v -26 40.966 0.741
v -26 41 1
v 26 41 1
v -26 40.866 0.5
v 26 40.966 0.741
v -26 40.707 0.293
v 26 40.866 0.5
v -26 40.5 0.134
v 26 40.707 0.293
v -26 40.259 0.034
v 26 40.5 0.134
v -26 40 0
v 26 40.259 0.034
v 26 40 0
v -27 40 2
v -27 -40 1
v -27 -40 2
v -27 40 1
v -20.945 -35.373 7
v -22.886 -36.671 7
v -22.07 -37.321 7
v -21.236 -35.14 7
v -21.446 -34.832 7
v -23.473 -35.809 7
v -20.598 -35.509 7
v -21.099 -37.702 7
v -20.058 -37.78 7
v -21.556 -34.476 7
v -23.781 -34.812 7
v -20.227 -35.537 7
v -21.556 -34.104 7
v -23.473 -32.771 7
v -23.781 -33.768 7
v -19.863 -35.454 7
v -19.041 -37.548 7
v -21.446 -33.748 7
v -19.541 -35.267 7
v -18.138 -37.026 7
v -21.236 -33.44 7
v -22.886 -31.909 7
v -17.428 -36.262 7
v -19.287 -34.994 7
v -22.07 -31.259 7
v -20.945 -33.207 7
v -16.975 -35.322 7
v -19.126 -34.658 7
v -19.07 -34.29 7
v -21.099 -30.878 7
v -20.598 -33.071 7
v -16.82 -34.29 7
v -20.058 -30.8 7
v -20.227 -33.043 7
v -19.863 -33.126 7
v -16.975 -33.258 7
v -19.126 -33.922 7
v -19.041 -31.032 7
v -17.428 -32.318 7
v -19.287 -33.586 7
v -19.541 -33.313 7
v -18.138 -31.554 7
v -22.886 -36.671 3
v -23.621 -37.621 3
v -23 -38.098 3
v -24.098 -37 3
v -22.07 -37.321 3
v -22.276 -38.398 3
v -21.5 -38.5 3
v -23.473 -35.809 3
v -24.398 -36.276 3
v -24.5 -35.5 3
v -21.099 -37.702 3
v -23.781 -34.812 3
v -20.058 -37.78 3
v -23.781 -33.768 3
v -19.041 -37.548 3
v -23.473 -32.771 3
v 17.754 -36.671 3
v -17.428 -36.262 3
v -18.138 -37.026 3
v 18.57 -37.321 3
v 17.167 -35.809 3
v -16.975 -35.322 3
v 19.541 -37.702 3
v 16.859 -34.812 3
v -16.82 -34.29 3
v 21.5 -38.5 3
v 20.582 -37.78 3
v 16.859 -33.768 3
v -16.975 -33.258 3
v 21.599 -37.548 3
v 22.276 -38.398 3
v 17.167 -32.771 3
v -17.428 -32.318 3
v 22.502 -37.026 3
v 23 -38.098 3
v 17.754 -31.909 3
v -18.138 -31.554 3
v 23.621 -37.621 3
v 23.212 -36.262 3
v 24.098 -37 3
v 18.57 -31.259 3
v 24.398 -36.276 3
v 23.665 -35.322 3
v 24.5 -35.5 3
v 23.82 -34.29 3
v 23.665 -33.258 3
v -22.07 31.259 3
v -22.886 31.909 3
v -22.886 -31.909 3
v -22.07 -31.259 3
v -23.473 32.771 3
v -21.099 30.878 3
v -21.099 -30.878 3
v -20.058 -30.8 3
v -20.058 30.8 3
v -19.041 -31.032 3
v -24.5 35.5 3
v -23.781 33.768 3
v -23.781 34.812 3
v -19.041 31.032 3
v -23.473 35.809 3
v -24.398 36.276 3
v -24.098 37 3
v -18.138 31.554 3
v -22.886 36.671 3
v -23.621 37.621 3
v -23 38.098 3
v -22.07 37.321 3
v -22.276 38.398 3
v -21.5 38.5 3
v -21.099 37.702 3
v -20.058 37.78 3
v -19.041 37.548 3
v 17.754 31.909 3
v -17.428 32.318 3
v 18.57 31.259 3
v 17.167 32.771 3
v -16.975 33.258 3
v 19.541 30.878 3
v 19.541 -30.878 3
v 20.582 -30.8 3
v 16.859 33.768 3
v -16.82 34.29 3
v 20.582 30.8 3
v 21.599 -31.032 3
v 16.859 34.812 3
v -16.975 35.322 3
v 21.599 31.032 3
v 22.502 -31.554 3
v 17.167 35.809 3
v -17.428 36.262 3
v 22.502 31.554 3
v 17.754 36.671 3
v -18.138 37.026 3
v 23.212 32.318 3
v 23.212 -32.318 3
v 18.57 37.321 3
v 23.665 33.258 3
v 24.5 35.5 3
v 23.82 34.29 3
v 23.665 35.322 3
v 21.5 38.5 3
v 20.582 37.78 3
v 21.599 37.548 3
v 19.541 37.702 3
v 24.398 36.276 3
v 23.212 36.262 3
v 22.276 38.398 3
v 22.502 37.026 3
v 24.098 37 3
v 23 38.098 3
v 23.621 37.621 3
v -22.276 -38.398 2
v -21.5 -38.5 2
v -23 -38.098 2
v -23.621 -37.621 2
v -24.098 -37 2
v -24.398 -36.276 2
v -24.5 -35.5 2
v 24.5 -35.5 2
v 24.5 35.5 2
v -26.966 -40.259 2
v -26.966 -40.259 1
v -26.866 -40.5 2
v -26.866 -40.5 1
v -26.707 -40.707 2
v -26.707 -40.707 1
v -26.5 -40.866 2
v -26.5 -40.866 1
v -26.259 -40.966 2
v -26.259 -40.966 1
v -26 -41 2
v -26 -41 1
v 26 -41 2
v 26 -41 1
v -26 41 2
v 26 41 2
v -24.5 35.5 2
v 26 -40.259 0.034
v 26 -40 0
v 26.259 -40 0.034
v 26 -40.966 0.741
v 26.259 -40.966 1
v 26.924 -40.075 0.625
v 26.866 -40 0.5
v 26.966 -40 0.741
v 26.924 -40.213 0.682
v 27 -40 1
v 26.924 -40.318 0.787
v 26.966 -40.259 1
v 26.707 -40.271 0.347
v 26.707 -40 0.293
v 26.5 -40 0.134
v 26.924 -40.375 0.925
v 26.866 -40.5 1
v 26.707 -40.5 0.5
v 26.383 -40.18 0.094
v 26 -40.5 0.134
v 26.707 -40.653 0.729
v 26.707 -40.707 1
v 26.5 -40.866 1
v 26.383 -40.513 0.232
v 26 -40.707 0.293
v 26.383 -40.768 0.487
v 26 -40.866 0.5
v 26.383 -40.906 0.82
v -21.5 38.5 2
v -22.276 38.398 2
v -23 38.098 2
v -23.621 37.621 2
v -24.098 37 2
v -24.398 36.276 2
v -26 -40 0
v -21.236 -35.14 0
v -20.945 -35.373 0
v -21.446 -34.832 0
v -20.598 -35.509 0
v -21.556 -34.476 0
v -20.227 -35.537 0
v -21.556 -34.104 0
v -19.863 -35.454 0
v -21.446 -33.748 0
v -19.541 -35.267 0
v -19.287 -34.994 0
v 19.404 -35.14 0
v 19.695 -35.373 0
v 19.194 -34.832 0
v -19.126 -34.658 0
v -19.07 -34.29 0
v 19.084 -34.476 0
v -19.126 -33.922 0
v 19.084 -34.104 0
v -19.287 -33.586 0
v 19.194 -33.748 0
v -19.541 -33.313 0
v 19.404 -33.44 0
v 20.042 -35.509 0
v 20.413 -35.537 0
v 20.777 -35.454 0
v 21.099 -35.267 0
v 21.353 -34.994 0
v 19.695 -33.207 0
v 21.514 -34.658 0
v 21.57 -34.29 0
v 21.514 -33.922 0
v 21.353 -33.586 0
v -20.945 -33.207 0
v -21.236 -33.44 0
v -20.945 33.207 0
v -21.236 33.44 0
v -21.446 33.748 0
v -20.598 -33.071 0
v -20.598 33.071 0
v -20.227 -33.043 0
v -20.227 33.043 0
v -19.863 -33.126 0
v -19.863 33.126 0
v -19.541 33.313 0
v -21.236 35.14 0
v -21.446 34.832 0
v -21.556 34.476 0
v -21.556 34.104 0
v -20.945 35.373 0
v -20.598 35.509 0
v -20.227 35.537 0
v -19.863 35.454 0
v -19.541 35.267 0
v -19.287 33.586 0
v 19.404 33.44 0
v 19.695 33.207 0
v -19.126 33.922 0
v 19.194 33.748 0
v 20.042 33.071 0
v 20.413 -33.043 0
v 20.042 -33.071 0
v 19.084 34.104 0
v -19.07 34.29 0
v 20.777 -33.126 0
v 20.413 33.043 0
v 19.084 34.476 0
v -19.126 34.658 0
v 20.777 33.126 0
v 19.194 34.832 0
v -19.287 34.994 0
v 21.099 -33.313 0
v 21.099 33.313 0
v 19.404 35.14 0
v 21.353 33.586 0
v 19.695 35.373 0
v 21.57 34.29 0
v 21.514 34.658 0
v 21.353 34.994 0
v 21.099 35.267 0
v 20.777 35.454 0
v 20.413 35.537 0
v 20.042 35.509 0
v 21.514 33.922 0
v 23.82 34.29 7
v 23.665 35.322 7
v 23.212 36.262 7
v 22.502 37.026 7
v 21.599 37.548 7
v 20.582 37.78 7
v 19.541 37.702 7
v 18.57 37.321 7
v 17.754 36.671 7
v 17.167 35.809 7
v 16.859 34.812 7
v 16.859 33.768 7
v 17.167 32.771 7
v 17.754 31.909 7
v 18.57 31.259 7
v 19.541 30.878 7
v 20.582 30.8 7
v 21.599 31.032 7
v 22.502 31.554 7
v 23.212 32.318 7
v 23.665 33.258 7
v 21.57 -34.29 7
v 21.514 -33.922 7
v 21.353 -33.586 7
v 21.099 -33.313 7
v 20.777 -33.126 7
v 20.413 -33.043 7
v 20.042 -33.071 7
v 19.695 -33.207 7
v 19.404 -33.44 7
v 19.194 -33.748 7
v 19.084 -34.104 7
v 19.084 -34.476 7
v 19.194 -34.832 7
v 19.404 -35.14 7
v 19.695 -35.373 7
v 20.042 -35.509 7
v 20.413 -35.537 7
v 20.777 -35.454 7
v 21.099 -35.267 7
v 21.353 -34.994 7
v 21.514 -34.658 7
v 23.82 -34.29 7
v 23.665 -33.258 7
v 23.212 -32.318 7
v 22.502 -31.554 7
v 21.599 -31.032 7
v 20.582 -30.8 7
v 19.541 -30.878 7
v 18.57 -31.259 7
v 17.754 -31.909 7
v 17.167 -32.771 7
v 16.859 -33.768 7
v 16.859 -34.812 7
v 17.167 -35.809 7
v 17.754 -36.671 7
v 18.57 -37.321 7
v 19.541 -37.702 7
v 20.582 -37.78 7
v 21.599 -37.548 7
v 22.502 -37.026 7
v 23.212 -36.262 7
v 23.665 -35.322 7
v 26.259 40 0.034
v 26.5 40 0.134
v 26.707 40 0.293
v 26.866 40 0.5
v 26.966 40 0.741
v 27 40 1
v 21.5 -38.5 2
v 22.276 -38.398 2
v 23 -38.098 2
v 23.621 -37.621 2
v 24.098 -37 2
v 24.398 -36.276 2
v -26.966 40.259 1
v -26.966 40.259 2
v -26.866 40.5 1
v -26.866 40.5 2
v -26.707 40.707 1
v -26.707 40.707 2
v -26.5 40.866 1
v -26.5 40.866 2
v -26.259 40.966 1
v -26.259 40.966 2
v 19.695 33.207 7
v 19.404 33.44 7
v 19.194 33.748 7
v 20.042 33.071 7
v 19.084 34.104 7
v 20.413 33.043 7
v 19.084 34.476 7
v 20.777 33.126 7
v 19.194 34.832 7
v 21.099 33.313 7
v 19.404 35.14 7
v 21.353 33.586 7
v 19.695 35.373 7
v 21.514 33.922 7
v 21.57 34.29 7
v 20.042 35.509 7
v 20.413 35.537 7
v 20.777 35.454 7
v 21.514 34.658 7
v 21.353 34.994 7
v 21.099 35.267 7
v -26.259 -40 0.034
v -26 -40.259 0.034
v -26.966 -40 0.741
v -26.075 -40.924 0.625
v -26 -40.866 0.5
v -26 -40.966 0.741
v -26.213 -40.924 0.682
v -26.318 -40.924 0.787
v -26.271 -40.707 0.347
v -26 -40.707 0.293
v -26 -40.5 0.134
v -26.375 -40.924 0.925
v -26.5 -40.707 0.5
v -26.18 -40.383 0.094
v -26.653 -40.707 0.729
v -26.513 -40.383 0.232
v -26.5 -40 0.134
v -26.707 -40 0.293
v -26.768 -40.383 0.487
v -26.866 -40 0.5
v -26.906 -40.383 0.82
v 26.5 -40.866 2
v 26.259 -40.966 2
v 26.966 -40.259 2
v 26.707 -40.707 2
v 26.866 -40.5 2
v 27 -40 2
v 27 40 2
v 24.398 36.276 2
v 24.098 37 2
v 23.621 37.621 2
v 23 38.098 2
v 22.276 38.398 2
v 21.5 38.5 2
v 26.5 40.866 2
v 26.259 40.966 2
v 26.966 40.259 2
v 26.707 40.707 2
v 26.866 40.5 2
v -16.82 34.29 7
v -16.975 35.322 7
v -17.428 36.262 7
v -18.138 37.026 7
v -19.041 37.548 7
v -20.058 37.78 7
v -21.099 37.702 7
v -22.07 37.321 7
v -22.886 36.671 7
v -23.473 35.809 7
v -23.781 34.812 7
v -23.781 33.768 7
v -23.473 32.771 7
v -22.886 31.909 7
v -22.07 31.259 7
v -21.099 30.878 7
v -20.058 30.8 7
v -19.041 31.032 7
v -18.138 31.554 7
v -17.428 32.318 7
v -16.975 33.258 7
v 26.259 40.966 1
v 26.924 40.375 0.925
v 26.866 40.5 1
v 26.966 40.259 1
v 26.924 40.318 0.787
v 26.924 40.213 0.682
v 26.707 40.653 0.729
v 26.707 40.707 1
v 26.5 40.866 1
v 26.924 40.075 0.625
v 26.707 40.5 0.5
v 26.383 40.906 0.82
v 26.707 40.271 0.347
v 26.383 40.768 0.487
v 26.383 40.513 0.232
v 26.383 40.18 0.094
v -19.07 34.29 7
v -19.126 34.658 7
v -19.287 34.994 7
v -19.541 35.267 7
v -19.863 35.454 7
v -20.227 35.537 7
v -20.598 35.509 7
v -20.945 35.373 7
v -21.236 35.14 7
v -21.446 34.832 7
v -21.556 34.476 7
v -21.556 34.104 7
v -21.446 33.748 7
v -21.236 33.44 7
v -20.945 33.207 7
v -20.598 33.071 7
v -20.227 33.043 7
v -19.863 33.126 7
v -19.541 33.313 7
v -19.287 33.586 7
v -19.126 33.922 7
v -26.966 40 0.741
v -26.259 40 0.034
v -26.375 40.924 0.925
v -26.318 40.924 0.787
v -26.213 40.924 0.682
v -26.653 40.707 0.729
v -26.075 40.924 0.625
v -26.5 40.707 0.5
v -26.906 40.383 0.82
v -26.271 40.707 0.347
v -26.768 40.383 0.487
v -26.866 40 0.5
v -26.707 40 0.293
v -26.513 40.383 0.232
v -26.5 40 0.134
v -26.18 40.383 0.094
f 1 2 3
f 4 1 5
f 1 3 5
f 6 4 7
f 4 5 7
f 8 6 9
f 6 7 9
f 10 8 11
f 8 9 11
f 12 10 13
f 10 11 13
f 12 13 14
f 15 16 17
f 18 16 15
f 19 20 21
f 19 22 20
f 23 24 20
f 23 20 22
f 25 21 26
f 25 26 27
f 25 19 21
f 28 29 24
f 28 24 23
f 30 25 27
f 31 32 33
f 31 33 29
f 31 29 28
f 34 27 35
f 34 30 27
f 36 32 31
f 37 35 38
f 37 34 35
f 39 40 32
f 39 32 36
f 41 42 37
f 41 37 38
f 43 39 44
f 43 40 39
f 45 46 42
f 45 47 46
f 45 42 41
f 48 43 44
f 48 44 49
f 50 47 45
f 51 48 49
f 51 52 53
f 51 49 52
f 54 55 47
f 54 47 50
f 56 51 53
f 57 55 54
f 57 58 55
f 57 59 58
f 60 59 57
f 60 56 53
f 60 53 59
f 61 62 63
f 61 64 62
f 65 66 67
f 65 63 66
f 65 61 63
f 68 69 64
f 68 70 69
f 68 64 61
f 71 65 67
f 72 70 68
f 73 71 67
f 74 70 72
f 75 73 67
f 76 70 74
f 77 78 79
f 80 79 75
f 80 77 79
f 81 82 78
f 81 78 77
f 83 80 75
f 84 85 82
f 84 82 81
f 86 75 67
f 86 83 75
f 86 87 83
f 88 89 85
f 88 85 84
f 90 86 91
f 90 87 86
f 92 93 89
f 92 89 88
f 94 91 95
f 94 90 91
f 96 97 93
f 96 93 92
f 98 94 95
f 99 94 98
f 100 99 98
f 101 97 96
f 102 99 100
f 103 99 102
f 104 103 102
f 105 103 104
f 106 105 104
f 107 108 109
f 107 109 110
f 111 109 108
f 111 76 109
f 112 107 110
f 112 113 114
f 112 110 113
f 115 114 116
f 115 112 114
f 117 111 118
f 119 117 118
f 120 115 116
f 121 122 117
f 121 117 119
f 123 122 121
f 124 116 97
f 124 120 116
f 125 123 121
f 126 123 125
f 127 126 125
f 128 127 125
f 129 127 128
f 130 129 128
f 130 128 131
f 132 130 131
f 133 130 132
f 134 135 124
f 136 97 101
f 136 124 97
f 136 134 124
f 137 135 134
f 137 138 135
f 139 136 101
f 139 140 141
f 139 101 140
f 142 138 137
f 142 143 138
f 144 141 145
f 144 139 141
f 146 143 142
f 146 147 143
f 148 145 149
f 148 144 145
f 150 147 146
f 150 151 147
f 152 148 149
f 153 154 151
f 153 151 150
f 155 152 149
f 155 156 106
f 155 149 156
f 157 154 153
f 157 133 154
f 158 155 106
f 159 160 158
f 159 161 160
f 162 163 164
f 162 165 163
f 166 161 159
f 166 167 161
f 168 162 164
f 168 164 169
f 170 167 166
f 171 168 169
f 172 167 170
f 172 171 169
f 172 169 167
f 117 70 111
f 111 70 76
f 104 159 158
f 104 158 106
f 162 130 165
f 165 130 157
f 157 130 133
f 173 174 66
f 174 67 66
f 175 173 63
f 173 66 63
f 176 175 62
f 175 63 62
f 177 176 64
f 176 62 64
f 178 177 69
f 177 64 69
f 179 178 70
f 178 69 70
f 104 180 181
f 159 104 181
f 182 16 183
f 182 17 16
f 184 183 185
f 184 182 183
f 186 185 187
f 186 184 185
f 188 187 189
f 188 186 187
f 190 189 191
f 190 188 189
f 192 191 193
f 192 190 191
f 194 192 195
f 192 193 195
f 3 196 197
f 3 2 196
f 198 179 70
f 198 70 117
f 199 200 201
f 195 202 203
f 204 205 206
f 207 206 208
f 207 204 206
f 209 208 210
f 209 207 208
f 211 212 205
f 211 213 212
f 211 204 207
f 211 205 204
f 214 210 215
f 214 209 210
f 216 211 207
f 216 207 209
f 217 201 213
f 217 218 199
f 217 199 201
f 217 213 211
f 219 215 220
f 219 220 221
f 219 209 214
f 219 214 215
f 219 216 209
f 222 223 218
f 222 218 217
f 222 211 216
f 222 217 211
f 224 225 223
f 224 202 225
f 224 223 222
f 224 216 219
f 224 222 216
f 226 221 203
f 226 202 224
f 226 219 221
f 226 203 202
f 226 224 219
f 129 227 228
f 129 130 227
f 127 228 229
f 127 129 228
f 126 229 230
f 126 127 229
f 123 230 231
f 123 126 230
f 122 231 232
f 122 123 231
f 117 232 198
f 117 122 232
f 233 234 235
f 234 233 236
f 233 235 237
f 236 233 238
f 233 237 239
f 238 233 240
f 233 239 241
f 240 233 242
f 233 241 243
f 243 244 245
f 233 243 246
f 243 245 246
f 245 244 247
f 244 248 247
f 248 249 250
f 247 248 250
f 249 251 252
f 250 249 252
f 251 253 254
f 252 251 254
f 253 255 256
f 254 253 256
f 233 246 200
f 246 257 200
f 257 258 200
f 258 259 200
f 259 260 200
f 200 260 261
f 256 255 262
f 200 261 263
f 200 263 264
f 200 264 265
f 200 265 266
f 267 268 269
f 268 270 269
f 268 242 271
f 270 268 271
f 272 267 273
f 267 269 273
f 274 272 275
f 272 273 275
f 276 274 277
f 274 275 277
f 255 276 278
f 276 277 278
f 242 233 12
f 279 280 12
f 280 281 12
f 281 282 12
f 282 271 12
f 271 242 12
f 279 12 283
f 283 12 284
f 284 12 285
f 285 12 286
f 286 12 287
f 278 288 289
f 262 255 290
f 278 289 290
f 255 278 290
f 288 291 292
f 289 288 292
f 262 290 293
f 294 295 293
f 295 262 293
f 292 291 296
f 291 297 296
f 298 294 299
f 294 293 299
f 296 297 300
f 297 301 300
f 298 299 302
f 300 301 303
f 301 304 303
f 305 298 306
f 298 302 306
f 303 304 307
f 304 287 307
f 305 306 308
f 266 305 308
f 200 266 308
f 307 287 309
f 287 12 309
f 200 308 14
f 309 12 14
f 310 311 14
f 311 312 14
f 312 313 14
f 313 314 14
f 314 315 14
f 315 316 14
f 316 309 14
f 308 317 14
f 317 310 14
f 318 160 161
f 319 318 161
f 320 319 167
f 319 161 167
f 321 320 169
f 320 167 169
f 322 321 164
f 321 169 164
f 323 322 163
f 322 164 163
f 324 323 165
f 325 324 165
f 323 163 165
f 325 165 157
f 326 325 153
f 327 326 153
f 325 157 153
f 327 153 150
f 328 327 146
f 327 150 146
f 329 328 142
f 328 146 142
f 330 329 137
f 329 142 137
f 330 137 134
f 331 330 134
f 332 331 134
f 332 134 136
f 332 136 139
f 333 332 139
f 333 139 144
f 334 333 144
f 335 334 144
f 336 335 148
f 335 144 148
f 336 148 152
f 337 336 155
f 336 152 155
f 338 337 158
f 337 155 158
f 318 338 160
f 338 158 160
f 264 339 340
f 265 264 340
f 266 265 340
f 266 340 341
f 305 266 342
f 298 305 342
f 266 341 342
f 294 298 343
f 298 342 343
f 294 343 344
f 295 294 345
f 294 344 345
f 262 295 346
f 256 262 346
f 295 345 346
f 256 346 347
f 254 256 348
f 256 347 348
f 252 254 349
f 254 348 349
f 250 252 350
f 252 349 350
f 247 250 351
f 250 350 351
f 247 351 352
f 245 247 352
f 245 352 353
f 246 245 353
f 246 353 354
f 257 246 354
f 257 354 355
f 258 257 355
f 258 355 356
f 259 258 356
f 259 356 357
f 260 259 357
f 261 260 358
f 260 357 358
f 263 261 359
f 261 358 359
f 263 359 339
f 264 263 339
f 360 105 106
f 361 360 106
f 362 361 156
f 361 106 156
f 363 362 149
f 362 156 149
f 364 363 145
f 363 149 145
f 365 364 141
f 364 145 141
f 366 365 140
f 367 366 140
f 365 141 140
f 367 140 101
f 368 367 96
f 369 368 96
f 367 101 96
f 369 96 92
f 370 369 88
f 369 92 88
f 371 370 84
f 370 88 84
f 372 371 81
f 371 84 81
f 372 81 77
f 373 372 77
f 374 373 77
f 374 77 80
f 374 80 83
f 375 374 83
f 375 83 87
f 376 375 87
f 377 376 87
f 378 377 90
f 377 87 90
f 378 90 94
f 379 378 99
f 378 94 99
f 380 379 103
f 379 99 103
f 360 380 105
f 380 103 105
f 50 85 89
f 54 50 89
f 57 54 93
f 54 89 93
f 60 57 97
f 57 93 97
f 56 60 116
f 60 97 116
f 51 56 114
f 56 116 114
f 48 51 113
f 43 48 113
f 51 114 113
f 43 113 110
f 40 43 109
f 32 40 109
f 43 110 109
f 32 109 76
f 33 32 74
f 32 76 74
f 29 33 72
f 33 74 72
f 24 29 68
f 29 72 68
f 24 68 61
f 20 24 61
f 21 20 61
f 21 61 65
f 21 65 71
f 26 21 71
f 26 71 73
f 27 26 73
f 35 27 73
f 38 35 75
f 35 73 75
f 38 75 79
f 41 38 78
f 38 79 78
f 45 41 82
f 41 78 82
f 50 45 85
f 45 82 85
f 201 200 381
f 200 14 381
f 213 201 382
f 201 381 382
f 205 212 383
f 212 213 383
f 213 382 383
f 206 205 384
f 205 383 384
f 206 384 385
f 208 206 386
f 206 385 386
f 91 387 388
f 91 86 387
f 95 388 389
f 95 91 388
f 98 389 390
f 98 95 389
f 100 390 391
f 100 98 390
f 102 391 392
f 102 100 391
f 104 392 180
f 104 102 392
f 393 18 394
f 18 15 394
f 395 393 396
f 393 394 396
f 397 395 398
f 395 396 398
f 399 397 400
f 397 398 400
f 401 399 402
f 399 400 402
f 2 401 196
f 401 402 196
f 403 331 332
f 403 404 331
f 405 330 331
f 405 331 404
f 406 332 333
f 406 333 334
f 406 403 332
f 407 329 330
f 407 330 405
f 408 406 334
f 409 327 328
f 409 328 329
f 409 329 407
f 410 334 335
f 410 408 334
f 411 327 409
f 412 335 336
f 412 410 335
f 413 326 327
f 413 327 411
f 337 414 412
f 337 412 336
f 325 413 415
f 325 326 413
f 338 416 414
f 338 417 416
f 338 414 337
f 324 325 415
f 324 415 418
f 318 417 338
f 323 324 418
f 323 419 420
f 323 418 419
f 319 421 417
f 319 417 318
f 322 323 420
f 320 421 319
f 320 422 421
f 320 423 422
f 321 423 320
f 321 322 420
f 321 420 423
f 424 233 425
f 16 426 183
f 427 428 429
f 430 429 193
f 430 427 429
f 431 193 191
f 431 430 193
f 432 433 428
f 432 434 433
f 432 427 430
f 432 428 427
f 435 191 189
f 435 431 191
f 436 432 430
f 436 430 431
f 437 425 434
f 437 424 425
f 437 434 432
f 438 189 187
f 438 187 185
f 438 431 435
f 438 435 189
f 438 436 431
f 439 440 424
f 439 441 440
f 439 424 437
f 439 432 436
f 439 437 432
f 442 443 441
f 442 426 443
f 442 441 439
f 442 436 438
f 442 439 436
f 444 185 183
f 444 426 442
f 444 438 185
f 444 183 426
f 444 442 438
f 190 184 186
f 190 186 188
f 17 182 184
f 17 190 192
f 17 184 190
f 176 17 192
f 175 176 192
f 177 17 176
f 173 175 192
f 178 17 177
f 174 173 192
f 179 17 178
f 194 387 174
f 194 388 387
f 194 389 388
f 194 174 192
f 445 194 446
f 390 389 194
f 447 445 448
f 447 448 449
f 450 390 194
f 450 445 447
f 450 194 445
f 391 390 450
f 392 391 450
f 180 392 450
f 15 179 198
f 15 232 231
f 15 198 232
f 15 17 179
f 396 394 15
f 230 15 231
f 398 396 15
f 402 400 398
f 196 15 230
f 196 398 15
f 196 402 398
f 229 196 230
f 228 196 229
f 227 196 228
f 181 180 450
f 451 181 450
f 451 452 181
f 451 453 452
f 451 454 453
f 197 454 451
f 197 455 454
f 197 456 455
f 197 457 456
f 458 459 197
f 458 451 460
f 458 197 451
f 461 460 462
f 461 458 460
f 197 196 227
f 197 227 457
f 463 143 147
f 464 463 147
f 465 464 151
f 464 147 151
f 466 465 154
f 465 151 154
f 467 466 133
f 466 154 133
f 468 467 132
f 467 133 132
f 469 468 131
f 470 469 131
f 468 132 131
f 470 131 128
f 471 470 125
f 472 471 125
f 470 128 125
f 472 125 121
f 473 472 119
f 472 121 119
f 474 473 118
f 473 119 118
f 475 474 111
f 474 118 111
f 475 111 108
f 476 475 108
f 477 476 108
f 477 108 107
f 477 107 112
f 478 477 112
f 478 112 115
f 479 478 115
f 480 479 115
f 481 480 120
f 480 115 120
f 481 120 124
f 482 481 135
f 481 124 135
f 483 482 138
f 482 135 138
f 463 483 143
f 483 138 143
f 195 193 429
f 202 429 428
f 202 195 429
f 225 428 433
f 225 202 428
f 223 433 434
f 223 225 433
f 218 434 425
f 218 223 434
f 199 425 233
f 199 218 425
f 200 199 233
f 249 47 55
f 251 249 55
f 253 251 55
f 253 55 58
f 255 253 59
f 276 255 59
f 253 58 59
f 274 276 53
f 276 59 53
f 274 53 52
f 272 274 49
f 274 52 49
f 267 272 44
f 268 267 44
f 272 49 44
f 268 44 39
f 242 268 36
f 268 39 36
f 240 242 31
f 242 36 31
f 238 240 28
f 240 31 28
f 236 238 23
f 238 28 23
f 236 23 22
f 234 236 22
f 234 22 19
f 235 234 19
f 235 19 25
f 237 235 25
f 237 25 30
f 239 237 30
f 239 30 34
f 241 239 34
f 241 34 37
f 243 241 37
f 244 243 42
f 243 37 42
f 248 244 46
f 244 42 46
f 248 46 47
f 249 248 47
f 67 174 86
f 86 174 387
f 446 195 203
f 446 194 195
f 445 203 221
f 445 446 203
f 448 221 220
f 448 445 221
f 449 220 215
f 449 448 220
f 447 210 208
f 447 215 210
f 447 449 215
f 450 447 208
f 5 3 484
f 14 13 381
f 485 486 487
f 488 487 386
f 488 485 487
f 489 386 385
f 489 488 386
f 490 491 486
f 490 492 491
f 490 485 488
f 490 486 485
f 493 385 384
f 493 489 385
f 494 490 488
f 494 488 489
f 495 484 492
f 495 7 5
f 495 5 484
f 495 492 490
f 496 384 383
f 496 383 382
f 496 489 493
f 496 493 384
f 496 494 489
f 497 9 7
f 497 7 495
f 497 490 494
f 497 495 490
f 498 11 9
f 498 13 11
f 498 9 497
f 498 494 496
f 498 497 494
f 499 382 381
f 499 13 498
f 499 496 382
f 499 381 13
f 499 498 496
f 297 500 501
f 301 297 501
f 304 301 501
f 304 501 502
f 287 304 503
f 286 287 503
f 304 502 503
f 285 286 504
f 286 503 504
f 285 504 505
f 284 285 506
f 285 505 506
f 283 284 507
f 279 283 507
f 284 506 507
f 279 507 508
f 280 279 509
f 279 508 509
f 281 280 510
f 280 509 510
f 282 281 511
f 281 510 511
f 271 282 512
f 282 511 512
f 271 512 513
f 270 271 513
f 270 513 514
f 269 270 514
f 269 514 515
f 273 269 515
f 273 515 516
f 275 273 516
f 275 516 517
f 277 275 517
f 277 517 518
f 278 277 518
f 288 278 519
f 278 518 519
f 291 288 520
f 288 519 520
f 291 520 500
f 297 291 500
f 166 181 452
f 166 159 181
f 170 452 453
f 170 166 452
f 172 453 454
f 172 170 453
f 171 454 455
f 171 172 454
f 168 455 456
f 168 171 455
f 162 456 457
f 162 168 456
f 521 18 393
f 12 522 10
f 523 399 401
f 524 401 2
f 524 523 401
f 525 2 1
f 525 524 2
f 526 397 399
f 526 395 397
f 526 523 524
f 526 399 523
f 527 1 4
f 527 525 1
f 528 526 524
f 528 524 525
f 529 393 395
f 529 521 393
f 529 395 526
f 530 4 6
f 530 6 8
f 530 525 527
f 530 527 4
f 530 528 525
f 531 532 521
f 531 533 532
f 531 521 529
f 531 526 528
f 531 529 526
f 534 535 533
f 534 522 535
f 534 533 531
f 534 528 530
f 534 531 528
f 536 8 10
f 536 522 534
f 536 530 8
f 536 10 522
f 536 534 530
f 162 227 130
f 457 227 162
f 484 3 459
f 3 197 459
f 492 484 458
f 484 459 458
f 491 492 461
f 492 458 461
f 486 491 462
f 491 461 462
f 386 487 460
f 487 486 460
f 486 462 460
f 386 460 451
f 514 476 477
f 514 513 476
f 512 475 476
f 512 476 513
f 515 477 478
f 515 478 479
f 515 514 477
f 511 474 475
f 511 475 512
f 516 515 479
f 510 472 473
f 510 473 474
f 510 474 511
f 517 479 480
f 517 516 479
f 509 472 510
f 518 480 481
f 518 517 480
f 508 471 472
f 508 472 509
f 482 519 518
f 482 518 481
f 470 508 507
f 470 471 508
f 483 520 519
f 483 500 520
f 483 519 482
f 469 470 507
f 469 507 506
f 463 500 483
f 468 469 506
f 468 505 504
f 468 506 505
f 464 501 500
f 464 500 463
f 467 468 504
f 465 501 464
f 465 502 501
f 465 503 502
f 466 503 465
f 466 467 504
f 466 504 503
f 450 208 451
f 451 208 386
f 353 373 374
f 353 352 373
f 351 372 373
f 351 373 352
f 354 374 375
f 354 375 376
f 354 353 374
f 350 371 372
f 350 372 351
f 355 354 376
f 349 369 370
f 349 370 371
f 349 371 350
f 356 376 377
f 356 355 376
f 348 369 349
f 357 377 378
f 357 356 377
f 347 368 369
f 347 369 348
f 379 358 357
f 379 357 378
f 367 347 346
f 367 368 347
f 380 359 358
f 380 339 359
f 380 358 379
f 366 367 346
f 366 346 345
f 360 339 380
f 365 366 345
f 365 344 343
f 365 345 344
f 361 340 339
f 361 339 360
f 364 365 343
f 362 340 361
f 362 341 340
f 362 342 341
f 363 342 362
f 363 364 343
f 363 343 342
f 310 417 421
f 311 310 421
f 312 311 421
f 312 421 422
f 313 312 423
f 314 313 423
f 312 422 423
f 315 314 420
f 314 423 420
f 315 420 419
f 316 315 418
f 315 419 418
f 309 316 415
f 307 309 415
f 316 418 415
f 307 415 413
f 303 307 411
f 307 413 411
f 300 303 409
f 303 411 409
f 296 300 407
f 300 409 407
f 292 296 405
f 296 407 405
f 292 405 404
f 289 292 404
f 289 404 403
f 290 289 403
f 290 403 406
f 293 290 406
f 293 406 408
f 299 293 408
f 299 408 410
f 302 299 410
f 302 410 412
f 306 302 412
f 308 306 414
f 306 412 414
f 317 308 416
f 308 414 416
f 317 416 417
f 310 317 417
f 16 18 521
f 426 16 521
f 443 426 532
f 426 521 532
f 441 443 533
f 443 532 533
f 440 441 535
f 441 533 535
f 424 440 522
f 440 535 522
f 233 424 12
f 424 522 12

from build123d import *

# Parameters (mm, degrees)
SKETCH_W     = 54
SKETCH_H     = 82
PAD_DEPTH    = 2
SKETCH001_W  = 49
SKETCH001_H  = 77
PAD001_DEPTH = 1
SKETCH002_R  = 3.5
PAD002_DEPTH = 4
SKETCH003_R  = 1.25
POCKET_DEPTH = 7
FILLET_R     = 1
FILLET001_R  = 3


with BuildPart() as part:
    # Sketch → Pad (new body)
    with BuildSketch(Plane.XY):
        Rectangle(SKETCH_W, SKETCH_H)
    extrude(amount=PAD_DEPTH)

    # Sketch001 (on Face6 of Pad) → Pad001 (join)
    with BuildSketch(Plane.XY.offset(2)):
        Rectangle(SKETCH001_W, SKETCH001_H)
    extrude(amount=PAD001_DEPTH)

    # Sketch002 (on Face11 of Pad001) → Pad002 (join)
    with BuildSketch(Plane.XY.offset(3)):
        with Locations((-20.32, 34.29)):
            Circle(SKETCH002_R)
        with Locations((20.32, 34.29)):
            Circle(SKETCH002_R)
        with Locations((-20.32, -34.29)):
            Circle(SKETCH002_R)
        with Locations((20.32, -34.29)):
            Circle(SKETCH002_R)
    extrude(amount=PAD002_DEPTH)

    # Sketch003 (on Face18 of Pad002) → Pocket (cut)
    with BuildSketch(Plane.XY.offset(7)):
        with Locations((-20.32, 34.29)):
            Circle(SKETCH003_R)
        with Locations((20.32, 34.29)):
            Circle(SKETCH003_R)
        with Locations((20.32, -34.29)):
            Circle(SKETCH003_R)
        with Locations((-20.32, -34.29)):
            Circle(SKETCH003_R)
    extrude(amount=-POCKET_DEPTH, mode=Mode.SUBTRACT)

    # Fillet
    fillet_edges = [part.edges().sort_by_distance(p)[0] for p in [
        (-27, 0, 0),
        (0, -41, 0),
        (-27, -41, 1),
        (-27, 41, 1),
        (0, 41, 0),
        (27, 41, 1),
        (27, 0, 0),
        (27, -41, 1),
    ]]
    fillet(fillet_edges, radius=FILLET_R)

    # Fillet001
    fillet001_edges = [part.edges().sort_by_distance(p)[0] for p in [
        (24.5, -38.5, 2.5),
        (24.5, 38.5, 2.5),
        (-24.5, 38.5, 2.5),
        (-24.5, -38.5, 2.5),
    ]]
    fillet(fillet001_edges, radius=FILLET001_R)


solid = part.part
